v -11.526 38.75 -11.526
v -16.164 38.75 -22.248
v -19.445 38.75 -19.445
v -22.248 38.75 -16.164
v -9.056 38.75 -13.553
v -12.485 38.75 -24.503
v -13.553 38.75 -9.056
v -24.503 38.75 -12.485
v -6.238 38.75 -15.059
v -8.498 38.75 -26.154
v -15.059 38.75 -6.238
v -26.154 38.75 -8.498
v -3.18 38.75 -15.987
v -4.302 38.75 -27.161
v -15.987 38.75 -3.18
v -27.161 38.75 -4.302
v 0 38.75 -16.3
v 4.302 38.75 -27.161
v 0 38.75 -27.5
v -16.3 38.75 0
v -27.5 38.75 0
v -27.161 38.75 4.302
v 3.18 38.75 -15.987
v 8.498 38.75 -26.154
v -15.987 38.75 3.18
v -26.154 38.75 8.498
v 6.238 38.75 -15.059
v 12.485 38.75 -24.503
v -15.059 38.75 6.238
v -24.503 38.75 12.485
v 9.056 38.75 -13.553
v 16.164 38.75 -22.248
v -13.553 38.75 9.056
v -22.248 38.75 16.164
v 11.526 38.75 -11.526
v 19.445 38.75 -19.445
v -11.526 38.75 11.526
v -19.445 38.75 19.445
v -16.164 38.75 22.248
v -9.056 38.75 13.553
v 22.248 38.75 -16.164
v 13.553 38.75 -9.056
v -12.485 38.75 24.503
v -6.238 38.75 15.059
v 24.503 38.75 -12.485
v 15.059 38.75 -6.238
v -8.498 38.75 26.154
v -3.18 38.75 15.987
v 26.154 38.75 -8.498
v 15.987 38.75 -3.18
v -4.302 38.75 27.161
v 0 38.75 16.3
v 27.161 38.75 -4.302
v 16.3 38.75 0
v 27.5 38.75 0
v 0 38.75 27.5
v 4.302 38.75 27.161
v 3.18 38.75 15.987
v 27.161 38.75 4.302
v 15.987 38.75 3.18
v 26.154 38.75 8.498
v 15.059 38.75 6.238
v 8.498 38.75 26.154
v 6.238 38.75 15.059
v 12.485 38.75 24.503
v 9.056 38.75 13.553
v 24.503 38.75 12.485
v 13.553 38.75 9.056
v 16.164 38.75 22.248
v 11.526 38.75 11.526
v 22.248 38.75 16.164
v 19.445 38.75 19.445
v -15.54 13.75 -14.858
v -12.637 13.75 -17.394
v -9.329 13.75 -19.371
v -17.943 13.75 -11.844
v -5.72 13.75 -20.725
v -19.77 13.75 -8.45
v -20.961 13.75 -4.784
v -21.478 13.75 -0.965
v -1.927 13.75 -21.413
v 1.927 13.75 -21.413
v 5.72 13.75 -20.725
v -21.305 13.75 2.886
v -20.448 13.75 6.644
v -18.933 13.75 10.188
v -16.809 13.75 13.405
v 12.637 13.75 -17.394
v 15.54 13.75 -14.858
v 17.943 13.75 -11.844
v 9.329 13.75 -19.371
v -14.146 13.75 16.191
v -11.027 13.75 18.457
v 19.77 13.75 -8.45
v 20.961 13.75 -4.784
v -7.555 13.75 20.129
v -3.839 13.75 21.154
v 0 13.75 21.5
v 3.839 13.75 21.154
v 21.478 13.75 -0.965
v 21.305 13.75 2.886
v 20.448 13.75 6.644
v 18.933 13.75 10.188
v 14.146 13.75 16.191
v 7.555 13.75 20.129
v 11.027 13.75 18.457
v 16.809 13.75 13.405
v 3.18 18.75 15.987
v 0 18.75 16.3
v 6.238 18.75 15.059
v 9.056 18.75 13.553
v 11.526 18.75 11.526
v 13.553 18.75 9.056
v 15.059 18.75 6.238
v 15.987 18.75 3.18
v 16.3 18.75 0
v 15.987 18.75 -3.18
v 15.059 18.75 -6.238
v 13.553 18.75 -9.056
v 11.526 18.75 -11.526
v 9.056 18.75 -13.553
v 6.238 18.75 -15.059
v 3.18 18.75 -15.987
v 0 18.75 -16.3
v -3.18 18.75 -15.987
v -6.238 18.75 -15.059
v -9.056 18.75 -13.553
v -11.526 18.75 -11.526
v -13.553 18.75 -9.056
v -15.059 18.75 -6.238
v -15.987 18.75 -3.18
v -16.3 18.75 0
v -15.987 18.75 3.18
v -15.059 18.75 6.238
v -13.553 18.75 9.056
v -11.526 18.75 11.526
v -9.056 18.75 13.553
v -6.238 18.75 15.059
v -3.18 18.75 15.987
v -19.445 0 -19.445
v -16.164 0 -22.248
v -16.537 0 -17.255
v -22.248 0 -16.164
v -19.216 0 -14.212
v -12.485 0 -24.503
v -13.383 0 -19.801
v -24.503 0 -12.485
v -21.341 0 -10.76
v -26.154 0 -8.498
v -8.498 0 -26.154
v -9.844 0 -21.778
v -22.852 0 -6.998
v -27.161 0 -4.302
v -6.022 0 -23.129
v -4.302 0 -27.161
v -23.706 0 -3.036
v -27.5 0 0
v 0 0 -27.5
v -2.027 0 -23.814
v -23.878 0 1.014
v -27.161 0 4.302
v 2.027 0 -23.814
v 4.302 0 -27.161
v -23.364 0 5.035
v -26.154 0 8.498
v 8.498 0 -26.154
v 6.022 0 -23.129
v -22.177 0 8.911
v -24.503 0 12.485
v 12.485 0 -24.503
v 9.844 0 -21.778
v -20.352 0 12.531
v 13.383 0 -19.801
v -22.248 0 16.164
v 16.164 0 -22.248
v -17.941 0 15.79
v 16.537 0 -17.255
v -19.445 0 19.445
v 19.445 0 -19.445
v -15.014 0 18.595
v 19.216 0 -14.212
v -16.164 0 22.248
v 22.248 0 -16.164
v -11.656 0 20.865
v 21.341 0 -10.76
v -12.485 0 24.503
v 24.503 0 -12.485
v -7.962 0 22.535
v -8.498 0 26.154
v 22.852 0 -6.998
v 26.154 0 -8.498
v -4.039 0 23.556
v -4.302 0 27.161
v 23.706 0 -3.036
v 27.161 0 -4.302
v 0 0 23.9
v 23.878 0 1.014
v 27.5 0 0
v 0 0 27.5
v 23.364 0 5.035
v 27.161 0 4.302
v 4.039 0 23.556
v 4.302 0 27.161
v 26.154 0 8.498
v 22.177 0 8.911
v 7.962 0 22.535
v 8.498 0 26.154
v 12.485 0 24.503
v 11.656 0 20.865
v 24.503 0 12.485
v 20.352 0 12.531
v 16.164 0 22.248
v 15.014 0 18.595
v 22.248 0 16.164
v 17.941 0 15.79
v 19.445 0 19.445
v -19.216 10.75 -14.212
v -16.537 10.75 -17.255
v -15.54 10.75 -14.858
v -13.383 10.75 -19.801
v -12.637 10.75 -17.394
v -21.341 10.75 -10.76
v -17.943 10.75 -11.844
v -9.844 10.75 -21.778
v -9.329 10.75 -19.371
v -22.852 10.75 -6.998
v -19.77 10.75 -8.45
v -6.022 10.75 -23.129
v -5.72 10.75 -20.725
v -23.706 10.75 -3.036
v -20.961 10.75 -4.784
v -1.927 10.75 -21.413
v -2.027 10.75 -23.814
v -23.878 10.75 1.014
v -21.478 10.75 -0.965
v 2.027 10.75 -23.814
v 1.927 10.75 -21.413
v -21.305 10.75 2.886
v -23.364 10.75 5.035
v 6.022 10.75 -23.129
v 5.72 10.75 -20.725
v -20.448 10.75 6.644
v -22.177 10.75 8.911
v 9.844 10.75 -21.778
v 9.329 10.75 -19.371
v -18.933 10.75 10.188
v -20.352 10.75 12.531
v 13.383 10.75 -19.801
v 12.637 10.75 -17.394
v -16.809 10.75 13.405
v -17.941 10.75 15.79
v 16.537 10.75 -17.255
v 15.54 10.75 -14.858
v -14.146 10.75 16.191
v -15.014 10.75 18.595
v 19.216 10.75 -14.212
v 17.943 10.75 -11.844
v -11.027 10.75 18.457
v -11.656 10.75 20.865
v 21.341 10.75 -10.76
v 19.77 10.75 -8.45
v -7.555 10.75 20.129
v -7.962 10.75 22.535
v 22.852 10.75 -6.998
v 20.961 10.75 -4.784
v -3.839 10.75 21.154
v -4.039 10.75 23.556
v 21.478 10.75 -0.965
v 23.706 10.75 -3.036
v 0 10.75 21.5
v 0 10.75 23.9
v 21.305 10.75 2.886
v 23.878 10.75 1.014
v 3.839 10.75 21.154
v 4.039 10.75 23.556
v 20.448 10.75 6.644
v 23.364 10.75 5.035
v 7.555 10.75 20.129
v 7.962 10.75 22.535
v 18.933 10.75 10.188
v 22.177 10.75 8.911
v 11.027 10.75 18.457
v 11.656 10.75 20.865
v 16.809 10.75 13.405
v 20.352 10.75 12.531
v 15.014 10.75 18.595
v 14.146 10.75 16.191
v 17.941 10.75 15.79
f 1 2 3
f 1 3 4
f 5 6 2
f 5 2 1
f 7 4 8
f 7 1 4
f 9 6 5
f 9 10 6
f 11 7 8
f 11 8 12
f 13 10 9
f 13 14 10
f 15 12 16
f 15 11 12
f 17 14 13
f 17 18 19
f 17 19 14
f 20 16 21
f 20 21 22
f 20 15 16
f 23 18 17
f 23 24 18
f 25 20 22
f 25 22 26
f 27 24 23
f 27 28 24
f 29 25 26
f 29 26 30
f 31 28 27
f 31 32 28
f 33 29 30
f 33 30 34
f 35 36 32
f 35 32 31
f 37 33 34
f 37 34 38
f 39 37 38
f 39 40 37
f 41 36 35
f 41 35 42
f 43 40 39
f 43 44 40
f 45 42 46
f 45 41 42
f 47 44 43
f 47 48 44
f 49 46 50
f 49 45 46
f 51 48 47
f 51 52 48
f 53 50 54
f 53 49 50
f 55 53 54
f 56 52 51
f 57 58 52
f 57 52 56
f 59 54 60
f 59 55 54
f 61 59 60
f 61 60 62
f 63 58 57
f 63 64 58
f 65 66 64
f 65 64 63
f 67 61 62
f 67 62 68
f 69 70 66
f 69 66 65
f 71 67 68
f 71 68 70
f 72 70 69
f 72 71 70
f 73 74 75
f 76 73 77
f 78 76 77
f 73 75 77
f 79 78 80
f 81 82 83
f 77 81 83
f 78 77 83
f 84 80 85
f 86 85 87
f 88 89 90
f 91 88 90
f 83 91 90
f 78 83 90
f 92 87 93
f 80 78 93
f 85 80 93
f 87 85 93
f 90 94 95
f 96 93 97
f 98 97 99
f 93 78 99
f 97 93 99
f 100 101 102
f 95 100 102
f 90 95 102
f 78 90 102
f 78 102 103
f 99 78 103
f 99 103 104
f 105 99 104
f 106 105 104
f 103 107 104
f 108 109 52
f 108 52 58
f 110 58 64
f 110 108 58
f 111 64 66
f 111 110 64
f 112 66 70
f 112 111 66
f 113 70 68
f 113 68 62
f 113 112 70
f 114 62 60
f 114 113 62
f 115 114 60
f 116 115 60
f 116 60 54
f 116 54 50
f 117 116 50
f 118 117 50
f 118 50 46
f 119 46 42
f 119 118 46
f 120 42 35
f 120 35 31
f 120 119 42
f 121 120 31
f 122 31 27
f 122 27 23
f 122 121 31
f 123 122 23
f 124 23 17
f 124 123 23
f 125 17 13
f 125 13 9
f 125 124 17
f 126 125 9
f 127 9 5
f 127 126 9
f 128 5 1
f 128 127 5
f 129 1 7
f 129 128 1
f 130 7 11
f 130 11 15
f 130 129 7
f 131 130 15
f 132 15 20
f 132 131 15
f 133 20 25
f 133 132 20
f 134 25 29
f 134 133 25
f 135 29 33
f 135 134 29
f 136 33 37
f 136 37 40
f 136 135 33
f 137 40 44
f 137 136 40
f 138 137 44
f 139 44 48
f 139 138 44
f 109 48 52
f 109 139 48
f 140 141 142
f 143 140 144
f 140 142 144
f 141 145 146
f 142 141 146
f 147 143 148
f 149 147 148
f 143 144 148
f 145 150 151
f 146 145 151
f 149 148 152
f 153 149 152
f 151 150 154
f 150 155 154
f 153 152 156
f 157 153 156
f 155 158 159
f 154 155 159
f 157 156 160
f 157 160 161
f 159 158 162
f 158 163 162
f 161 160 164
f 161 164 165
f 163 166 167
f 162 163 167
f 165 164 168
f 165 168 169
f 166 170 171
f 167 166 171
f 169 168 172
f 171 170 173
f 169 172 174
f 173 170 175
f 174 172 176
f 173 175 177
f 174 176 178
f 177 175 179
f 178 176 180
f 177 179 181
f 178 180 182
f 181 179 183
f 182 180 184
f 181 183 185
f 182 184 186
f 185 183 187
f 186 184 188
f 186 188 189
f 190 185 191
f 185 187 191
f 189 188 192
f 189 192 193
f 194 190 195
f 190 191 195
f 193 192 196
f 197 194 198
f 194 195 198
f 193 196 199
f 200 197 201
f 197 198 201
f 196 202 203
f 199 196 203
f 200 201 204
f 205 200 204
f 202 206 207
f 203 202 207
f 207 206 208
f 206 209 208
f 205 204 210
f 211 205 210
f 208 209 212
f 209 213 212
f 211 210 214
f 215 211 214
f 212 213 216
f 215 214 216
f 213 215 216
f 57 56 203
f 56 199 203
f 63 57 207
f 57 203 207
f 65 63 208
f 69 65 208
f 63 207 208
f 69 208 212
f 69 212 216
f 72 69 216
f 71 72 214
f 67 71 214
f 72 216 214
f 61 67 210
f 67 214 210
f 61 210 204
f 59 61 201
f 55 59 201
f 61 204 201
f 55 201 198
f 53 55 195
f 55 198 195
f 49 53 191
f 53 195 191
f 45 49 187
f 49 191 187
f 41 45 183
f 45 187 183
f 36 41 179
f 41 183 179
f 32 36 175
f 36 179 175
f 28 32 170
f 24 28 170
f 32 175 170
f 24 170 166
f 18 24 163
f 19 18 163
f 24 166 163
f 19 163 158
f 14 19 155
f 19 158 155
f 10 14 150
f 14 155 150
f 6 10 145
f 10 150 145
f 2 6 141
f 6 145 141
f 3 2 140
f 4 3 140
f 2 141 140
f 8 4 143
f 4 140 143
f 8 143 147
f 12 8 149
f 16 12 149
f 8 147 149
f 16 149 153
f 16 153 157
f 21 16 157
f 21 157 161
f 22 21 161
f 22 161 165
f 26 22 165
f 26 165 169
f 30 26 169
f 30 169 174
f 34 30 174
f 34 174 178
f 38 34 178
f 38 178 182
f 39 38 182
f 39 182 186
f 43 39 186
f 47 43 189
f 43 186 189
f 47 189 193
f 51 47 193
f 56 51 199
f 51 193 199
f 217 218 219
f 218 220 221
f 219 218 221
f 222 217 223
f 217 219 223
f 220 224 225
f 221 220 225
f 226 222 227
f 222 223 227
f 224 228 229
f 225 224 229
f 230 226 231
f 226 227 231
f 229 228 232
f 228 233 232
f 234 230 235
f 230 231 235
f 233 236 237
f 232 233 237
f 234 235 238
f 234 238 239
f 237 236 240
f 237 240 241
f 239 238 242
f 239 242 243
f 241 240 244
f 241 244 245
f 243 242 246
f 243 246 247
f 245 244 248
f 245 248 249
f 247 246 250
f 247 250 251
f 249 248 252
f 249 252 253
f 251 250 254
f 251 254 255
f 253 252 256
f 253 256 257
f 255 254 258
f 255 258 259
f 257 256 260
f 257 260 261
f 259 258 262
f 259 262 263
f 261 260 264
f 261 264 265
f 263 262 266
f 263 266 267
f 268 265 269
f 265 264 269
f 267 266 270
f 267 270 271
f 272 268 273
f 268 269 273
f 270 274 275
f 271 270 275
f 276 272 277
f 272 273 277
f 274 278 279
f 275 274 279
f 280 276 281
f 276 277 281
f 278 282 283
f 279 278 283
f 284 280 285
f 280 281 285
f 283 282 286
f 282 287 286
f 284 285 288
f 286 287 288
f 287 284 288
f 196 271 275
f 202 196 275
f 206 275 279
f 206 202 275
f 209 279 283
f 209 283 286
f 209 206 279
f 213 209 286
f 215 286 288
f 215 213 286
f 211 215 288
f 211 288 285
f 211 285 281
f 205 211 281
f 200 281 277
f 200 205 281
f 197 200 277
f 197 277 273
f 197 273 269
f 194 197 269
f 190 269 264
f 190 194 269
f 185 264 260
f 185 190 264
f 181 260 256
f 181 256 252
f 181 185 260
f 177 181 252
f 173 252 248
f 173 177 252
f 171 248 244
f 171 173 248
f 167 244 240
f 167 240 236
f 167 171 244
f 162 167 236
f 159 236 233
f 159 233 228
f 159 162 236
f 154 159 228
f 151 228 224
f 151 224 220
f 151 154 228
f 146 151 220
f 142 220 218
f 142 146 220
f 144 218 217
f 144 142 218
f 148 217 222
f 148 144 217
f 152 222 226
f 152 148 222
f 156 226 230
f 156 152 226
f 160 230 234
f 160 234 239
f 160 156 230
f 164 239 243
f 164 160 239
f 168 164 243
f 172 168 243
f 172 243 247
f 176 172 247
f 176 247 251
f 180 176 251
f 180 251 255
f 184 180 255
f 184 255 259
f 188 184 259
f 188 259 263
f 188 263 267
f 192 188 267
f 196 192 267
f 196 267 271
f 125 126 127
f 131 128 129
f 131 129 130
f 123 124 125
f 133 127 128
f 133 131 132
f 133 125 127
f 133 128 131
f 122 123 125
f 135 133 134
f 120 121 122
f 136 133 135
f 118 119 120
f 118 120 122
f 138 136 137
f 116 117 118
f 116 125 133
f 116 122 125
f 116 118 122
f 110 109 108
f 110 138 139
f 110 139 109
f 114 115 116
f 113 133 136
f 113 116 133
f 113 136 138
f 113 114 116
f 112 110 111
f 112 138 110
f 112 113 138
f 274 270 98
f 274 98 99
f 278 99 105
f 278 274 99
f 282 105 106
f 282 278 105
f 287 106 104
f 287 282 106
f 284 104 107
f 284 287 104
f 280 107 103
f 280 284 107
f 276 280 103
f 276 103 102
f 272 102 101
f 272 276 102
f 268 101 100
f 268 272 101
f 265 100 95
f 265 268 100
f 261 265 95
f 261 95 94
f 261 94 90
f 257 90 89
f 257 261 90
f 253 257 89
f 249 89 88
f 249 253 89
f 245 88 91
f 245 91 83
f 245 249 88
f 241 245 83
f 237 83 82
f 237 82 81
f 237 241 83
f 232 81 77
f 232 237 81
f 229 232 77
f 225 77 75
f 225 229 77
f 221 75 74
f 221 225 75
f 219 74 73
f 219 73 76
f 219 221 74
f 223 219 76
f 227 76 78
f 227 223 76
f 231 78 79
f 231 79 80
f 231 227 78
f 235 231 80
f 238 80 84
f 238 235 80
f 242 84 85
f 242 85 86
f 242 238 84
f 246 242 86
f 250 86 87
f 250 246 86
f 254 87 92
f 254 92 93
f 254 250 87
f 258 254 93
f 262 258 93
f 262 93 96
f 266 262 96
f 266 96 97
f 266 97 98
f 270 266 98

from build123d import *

# Parameters (mm, degrees)
SKETCH1_R           = 27.5
SKETCH1_R_2         = 23.9
BOSS_EXTRUDE1_DEPTH = 10.75
SKETCH2_R           = 27.5
SKETCH2_R_2         = 21.5
BOSS_EXTRUDE2_DEPTH = 3
SKETCH3_R           = 27.5
BOSS_EXTRUDE3_DEPTH = 5
SKETCH4_R           = 27.5
SKETCH4_R_2         = 16.3
BOSS_EXTRUDE4_DEPTH = 20


with BuildPart() as part:
    # Sketch1 → Boss-Extrude1 (new body)
    with BuildSketch(Plane(origin=(0, 0, 0), x_dir=(1, 0, 0), z_dir=(0, 1, 0))):
        with Locations(Location((0, 0, 0), (0, 0, 270))):
            Circle(SKETCH1_R)
        with Locations(Location((0, 0, 0), (0, 0, 270))):
            Circle(SKETCH1_R_2, mode=Mode.SUBTRACT)
    extrude(amount=BOSS_EXTRUDE1_DEPTH)

    # Sketch2 → Boss-Extrude2 (add)
    with BuildSketch(Plane(origin=(0, 10.75, 0), x_dir=(1, 0, 0), z_dir=(0, 1, 0))):
        with Locations(Location((0, 0, 0), (0, 0, 270))):
            Circle(SKETCH2_R)
        with Locations(Location((0, 0, 0), (0, 0, 270))):
            Circle(SKETCH2_R_2, mode=Mode.SUBTRACT)
    extrude(amount=BOSS_EXTRUDE2_DEPTH)

    # Sketch3 → Boss-Extrude3 (add)
    with BuildSketch(Plane(origin=(0, 13.75, 0), x_dir=(1, 0, 0), z_dir=(0, 1, 0))):
        with Locations(Location((0, 0, 0), (0, 0, 270))):
            Circle(SKETCH3_R)
    extrude(amount=BOSS_EXTRUDE3_DEPTH)

    # Sketch4 → Boss-Extrude4 (add)
    with BuildSketch(Plane(origin=(0, 18.75, 0), x_dir=(1, 0, 0), z_dir=(0, 1, 0))):
        with Locations(Location((0, 0, 0), (0, 0, 270))):
            Circle(SKETCH4_R)
        with Locations(Location((0, 0, 0), (0, 0, 270))):
            Circle(SKETCH4_R_2, mode=Mode.SUBTRACT)
    extrude(amount=BOSS_EXTRUDE4_DEPTH)


solid = part.part
